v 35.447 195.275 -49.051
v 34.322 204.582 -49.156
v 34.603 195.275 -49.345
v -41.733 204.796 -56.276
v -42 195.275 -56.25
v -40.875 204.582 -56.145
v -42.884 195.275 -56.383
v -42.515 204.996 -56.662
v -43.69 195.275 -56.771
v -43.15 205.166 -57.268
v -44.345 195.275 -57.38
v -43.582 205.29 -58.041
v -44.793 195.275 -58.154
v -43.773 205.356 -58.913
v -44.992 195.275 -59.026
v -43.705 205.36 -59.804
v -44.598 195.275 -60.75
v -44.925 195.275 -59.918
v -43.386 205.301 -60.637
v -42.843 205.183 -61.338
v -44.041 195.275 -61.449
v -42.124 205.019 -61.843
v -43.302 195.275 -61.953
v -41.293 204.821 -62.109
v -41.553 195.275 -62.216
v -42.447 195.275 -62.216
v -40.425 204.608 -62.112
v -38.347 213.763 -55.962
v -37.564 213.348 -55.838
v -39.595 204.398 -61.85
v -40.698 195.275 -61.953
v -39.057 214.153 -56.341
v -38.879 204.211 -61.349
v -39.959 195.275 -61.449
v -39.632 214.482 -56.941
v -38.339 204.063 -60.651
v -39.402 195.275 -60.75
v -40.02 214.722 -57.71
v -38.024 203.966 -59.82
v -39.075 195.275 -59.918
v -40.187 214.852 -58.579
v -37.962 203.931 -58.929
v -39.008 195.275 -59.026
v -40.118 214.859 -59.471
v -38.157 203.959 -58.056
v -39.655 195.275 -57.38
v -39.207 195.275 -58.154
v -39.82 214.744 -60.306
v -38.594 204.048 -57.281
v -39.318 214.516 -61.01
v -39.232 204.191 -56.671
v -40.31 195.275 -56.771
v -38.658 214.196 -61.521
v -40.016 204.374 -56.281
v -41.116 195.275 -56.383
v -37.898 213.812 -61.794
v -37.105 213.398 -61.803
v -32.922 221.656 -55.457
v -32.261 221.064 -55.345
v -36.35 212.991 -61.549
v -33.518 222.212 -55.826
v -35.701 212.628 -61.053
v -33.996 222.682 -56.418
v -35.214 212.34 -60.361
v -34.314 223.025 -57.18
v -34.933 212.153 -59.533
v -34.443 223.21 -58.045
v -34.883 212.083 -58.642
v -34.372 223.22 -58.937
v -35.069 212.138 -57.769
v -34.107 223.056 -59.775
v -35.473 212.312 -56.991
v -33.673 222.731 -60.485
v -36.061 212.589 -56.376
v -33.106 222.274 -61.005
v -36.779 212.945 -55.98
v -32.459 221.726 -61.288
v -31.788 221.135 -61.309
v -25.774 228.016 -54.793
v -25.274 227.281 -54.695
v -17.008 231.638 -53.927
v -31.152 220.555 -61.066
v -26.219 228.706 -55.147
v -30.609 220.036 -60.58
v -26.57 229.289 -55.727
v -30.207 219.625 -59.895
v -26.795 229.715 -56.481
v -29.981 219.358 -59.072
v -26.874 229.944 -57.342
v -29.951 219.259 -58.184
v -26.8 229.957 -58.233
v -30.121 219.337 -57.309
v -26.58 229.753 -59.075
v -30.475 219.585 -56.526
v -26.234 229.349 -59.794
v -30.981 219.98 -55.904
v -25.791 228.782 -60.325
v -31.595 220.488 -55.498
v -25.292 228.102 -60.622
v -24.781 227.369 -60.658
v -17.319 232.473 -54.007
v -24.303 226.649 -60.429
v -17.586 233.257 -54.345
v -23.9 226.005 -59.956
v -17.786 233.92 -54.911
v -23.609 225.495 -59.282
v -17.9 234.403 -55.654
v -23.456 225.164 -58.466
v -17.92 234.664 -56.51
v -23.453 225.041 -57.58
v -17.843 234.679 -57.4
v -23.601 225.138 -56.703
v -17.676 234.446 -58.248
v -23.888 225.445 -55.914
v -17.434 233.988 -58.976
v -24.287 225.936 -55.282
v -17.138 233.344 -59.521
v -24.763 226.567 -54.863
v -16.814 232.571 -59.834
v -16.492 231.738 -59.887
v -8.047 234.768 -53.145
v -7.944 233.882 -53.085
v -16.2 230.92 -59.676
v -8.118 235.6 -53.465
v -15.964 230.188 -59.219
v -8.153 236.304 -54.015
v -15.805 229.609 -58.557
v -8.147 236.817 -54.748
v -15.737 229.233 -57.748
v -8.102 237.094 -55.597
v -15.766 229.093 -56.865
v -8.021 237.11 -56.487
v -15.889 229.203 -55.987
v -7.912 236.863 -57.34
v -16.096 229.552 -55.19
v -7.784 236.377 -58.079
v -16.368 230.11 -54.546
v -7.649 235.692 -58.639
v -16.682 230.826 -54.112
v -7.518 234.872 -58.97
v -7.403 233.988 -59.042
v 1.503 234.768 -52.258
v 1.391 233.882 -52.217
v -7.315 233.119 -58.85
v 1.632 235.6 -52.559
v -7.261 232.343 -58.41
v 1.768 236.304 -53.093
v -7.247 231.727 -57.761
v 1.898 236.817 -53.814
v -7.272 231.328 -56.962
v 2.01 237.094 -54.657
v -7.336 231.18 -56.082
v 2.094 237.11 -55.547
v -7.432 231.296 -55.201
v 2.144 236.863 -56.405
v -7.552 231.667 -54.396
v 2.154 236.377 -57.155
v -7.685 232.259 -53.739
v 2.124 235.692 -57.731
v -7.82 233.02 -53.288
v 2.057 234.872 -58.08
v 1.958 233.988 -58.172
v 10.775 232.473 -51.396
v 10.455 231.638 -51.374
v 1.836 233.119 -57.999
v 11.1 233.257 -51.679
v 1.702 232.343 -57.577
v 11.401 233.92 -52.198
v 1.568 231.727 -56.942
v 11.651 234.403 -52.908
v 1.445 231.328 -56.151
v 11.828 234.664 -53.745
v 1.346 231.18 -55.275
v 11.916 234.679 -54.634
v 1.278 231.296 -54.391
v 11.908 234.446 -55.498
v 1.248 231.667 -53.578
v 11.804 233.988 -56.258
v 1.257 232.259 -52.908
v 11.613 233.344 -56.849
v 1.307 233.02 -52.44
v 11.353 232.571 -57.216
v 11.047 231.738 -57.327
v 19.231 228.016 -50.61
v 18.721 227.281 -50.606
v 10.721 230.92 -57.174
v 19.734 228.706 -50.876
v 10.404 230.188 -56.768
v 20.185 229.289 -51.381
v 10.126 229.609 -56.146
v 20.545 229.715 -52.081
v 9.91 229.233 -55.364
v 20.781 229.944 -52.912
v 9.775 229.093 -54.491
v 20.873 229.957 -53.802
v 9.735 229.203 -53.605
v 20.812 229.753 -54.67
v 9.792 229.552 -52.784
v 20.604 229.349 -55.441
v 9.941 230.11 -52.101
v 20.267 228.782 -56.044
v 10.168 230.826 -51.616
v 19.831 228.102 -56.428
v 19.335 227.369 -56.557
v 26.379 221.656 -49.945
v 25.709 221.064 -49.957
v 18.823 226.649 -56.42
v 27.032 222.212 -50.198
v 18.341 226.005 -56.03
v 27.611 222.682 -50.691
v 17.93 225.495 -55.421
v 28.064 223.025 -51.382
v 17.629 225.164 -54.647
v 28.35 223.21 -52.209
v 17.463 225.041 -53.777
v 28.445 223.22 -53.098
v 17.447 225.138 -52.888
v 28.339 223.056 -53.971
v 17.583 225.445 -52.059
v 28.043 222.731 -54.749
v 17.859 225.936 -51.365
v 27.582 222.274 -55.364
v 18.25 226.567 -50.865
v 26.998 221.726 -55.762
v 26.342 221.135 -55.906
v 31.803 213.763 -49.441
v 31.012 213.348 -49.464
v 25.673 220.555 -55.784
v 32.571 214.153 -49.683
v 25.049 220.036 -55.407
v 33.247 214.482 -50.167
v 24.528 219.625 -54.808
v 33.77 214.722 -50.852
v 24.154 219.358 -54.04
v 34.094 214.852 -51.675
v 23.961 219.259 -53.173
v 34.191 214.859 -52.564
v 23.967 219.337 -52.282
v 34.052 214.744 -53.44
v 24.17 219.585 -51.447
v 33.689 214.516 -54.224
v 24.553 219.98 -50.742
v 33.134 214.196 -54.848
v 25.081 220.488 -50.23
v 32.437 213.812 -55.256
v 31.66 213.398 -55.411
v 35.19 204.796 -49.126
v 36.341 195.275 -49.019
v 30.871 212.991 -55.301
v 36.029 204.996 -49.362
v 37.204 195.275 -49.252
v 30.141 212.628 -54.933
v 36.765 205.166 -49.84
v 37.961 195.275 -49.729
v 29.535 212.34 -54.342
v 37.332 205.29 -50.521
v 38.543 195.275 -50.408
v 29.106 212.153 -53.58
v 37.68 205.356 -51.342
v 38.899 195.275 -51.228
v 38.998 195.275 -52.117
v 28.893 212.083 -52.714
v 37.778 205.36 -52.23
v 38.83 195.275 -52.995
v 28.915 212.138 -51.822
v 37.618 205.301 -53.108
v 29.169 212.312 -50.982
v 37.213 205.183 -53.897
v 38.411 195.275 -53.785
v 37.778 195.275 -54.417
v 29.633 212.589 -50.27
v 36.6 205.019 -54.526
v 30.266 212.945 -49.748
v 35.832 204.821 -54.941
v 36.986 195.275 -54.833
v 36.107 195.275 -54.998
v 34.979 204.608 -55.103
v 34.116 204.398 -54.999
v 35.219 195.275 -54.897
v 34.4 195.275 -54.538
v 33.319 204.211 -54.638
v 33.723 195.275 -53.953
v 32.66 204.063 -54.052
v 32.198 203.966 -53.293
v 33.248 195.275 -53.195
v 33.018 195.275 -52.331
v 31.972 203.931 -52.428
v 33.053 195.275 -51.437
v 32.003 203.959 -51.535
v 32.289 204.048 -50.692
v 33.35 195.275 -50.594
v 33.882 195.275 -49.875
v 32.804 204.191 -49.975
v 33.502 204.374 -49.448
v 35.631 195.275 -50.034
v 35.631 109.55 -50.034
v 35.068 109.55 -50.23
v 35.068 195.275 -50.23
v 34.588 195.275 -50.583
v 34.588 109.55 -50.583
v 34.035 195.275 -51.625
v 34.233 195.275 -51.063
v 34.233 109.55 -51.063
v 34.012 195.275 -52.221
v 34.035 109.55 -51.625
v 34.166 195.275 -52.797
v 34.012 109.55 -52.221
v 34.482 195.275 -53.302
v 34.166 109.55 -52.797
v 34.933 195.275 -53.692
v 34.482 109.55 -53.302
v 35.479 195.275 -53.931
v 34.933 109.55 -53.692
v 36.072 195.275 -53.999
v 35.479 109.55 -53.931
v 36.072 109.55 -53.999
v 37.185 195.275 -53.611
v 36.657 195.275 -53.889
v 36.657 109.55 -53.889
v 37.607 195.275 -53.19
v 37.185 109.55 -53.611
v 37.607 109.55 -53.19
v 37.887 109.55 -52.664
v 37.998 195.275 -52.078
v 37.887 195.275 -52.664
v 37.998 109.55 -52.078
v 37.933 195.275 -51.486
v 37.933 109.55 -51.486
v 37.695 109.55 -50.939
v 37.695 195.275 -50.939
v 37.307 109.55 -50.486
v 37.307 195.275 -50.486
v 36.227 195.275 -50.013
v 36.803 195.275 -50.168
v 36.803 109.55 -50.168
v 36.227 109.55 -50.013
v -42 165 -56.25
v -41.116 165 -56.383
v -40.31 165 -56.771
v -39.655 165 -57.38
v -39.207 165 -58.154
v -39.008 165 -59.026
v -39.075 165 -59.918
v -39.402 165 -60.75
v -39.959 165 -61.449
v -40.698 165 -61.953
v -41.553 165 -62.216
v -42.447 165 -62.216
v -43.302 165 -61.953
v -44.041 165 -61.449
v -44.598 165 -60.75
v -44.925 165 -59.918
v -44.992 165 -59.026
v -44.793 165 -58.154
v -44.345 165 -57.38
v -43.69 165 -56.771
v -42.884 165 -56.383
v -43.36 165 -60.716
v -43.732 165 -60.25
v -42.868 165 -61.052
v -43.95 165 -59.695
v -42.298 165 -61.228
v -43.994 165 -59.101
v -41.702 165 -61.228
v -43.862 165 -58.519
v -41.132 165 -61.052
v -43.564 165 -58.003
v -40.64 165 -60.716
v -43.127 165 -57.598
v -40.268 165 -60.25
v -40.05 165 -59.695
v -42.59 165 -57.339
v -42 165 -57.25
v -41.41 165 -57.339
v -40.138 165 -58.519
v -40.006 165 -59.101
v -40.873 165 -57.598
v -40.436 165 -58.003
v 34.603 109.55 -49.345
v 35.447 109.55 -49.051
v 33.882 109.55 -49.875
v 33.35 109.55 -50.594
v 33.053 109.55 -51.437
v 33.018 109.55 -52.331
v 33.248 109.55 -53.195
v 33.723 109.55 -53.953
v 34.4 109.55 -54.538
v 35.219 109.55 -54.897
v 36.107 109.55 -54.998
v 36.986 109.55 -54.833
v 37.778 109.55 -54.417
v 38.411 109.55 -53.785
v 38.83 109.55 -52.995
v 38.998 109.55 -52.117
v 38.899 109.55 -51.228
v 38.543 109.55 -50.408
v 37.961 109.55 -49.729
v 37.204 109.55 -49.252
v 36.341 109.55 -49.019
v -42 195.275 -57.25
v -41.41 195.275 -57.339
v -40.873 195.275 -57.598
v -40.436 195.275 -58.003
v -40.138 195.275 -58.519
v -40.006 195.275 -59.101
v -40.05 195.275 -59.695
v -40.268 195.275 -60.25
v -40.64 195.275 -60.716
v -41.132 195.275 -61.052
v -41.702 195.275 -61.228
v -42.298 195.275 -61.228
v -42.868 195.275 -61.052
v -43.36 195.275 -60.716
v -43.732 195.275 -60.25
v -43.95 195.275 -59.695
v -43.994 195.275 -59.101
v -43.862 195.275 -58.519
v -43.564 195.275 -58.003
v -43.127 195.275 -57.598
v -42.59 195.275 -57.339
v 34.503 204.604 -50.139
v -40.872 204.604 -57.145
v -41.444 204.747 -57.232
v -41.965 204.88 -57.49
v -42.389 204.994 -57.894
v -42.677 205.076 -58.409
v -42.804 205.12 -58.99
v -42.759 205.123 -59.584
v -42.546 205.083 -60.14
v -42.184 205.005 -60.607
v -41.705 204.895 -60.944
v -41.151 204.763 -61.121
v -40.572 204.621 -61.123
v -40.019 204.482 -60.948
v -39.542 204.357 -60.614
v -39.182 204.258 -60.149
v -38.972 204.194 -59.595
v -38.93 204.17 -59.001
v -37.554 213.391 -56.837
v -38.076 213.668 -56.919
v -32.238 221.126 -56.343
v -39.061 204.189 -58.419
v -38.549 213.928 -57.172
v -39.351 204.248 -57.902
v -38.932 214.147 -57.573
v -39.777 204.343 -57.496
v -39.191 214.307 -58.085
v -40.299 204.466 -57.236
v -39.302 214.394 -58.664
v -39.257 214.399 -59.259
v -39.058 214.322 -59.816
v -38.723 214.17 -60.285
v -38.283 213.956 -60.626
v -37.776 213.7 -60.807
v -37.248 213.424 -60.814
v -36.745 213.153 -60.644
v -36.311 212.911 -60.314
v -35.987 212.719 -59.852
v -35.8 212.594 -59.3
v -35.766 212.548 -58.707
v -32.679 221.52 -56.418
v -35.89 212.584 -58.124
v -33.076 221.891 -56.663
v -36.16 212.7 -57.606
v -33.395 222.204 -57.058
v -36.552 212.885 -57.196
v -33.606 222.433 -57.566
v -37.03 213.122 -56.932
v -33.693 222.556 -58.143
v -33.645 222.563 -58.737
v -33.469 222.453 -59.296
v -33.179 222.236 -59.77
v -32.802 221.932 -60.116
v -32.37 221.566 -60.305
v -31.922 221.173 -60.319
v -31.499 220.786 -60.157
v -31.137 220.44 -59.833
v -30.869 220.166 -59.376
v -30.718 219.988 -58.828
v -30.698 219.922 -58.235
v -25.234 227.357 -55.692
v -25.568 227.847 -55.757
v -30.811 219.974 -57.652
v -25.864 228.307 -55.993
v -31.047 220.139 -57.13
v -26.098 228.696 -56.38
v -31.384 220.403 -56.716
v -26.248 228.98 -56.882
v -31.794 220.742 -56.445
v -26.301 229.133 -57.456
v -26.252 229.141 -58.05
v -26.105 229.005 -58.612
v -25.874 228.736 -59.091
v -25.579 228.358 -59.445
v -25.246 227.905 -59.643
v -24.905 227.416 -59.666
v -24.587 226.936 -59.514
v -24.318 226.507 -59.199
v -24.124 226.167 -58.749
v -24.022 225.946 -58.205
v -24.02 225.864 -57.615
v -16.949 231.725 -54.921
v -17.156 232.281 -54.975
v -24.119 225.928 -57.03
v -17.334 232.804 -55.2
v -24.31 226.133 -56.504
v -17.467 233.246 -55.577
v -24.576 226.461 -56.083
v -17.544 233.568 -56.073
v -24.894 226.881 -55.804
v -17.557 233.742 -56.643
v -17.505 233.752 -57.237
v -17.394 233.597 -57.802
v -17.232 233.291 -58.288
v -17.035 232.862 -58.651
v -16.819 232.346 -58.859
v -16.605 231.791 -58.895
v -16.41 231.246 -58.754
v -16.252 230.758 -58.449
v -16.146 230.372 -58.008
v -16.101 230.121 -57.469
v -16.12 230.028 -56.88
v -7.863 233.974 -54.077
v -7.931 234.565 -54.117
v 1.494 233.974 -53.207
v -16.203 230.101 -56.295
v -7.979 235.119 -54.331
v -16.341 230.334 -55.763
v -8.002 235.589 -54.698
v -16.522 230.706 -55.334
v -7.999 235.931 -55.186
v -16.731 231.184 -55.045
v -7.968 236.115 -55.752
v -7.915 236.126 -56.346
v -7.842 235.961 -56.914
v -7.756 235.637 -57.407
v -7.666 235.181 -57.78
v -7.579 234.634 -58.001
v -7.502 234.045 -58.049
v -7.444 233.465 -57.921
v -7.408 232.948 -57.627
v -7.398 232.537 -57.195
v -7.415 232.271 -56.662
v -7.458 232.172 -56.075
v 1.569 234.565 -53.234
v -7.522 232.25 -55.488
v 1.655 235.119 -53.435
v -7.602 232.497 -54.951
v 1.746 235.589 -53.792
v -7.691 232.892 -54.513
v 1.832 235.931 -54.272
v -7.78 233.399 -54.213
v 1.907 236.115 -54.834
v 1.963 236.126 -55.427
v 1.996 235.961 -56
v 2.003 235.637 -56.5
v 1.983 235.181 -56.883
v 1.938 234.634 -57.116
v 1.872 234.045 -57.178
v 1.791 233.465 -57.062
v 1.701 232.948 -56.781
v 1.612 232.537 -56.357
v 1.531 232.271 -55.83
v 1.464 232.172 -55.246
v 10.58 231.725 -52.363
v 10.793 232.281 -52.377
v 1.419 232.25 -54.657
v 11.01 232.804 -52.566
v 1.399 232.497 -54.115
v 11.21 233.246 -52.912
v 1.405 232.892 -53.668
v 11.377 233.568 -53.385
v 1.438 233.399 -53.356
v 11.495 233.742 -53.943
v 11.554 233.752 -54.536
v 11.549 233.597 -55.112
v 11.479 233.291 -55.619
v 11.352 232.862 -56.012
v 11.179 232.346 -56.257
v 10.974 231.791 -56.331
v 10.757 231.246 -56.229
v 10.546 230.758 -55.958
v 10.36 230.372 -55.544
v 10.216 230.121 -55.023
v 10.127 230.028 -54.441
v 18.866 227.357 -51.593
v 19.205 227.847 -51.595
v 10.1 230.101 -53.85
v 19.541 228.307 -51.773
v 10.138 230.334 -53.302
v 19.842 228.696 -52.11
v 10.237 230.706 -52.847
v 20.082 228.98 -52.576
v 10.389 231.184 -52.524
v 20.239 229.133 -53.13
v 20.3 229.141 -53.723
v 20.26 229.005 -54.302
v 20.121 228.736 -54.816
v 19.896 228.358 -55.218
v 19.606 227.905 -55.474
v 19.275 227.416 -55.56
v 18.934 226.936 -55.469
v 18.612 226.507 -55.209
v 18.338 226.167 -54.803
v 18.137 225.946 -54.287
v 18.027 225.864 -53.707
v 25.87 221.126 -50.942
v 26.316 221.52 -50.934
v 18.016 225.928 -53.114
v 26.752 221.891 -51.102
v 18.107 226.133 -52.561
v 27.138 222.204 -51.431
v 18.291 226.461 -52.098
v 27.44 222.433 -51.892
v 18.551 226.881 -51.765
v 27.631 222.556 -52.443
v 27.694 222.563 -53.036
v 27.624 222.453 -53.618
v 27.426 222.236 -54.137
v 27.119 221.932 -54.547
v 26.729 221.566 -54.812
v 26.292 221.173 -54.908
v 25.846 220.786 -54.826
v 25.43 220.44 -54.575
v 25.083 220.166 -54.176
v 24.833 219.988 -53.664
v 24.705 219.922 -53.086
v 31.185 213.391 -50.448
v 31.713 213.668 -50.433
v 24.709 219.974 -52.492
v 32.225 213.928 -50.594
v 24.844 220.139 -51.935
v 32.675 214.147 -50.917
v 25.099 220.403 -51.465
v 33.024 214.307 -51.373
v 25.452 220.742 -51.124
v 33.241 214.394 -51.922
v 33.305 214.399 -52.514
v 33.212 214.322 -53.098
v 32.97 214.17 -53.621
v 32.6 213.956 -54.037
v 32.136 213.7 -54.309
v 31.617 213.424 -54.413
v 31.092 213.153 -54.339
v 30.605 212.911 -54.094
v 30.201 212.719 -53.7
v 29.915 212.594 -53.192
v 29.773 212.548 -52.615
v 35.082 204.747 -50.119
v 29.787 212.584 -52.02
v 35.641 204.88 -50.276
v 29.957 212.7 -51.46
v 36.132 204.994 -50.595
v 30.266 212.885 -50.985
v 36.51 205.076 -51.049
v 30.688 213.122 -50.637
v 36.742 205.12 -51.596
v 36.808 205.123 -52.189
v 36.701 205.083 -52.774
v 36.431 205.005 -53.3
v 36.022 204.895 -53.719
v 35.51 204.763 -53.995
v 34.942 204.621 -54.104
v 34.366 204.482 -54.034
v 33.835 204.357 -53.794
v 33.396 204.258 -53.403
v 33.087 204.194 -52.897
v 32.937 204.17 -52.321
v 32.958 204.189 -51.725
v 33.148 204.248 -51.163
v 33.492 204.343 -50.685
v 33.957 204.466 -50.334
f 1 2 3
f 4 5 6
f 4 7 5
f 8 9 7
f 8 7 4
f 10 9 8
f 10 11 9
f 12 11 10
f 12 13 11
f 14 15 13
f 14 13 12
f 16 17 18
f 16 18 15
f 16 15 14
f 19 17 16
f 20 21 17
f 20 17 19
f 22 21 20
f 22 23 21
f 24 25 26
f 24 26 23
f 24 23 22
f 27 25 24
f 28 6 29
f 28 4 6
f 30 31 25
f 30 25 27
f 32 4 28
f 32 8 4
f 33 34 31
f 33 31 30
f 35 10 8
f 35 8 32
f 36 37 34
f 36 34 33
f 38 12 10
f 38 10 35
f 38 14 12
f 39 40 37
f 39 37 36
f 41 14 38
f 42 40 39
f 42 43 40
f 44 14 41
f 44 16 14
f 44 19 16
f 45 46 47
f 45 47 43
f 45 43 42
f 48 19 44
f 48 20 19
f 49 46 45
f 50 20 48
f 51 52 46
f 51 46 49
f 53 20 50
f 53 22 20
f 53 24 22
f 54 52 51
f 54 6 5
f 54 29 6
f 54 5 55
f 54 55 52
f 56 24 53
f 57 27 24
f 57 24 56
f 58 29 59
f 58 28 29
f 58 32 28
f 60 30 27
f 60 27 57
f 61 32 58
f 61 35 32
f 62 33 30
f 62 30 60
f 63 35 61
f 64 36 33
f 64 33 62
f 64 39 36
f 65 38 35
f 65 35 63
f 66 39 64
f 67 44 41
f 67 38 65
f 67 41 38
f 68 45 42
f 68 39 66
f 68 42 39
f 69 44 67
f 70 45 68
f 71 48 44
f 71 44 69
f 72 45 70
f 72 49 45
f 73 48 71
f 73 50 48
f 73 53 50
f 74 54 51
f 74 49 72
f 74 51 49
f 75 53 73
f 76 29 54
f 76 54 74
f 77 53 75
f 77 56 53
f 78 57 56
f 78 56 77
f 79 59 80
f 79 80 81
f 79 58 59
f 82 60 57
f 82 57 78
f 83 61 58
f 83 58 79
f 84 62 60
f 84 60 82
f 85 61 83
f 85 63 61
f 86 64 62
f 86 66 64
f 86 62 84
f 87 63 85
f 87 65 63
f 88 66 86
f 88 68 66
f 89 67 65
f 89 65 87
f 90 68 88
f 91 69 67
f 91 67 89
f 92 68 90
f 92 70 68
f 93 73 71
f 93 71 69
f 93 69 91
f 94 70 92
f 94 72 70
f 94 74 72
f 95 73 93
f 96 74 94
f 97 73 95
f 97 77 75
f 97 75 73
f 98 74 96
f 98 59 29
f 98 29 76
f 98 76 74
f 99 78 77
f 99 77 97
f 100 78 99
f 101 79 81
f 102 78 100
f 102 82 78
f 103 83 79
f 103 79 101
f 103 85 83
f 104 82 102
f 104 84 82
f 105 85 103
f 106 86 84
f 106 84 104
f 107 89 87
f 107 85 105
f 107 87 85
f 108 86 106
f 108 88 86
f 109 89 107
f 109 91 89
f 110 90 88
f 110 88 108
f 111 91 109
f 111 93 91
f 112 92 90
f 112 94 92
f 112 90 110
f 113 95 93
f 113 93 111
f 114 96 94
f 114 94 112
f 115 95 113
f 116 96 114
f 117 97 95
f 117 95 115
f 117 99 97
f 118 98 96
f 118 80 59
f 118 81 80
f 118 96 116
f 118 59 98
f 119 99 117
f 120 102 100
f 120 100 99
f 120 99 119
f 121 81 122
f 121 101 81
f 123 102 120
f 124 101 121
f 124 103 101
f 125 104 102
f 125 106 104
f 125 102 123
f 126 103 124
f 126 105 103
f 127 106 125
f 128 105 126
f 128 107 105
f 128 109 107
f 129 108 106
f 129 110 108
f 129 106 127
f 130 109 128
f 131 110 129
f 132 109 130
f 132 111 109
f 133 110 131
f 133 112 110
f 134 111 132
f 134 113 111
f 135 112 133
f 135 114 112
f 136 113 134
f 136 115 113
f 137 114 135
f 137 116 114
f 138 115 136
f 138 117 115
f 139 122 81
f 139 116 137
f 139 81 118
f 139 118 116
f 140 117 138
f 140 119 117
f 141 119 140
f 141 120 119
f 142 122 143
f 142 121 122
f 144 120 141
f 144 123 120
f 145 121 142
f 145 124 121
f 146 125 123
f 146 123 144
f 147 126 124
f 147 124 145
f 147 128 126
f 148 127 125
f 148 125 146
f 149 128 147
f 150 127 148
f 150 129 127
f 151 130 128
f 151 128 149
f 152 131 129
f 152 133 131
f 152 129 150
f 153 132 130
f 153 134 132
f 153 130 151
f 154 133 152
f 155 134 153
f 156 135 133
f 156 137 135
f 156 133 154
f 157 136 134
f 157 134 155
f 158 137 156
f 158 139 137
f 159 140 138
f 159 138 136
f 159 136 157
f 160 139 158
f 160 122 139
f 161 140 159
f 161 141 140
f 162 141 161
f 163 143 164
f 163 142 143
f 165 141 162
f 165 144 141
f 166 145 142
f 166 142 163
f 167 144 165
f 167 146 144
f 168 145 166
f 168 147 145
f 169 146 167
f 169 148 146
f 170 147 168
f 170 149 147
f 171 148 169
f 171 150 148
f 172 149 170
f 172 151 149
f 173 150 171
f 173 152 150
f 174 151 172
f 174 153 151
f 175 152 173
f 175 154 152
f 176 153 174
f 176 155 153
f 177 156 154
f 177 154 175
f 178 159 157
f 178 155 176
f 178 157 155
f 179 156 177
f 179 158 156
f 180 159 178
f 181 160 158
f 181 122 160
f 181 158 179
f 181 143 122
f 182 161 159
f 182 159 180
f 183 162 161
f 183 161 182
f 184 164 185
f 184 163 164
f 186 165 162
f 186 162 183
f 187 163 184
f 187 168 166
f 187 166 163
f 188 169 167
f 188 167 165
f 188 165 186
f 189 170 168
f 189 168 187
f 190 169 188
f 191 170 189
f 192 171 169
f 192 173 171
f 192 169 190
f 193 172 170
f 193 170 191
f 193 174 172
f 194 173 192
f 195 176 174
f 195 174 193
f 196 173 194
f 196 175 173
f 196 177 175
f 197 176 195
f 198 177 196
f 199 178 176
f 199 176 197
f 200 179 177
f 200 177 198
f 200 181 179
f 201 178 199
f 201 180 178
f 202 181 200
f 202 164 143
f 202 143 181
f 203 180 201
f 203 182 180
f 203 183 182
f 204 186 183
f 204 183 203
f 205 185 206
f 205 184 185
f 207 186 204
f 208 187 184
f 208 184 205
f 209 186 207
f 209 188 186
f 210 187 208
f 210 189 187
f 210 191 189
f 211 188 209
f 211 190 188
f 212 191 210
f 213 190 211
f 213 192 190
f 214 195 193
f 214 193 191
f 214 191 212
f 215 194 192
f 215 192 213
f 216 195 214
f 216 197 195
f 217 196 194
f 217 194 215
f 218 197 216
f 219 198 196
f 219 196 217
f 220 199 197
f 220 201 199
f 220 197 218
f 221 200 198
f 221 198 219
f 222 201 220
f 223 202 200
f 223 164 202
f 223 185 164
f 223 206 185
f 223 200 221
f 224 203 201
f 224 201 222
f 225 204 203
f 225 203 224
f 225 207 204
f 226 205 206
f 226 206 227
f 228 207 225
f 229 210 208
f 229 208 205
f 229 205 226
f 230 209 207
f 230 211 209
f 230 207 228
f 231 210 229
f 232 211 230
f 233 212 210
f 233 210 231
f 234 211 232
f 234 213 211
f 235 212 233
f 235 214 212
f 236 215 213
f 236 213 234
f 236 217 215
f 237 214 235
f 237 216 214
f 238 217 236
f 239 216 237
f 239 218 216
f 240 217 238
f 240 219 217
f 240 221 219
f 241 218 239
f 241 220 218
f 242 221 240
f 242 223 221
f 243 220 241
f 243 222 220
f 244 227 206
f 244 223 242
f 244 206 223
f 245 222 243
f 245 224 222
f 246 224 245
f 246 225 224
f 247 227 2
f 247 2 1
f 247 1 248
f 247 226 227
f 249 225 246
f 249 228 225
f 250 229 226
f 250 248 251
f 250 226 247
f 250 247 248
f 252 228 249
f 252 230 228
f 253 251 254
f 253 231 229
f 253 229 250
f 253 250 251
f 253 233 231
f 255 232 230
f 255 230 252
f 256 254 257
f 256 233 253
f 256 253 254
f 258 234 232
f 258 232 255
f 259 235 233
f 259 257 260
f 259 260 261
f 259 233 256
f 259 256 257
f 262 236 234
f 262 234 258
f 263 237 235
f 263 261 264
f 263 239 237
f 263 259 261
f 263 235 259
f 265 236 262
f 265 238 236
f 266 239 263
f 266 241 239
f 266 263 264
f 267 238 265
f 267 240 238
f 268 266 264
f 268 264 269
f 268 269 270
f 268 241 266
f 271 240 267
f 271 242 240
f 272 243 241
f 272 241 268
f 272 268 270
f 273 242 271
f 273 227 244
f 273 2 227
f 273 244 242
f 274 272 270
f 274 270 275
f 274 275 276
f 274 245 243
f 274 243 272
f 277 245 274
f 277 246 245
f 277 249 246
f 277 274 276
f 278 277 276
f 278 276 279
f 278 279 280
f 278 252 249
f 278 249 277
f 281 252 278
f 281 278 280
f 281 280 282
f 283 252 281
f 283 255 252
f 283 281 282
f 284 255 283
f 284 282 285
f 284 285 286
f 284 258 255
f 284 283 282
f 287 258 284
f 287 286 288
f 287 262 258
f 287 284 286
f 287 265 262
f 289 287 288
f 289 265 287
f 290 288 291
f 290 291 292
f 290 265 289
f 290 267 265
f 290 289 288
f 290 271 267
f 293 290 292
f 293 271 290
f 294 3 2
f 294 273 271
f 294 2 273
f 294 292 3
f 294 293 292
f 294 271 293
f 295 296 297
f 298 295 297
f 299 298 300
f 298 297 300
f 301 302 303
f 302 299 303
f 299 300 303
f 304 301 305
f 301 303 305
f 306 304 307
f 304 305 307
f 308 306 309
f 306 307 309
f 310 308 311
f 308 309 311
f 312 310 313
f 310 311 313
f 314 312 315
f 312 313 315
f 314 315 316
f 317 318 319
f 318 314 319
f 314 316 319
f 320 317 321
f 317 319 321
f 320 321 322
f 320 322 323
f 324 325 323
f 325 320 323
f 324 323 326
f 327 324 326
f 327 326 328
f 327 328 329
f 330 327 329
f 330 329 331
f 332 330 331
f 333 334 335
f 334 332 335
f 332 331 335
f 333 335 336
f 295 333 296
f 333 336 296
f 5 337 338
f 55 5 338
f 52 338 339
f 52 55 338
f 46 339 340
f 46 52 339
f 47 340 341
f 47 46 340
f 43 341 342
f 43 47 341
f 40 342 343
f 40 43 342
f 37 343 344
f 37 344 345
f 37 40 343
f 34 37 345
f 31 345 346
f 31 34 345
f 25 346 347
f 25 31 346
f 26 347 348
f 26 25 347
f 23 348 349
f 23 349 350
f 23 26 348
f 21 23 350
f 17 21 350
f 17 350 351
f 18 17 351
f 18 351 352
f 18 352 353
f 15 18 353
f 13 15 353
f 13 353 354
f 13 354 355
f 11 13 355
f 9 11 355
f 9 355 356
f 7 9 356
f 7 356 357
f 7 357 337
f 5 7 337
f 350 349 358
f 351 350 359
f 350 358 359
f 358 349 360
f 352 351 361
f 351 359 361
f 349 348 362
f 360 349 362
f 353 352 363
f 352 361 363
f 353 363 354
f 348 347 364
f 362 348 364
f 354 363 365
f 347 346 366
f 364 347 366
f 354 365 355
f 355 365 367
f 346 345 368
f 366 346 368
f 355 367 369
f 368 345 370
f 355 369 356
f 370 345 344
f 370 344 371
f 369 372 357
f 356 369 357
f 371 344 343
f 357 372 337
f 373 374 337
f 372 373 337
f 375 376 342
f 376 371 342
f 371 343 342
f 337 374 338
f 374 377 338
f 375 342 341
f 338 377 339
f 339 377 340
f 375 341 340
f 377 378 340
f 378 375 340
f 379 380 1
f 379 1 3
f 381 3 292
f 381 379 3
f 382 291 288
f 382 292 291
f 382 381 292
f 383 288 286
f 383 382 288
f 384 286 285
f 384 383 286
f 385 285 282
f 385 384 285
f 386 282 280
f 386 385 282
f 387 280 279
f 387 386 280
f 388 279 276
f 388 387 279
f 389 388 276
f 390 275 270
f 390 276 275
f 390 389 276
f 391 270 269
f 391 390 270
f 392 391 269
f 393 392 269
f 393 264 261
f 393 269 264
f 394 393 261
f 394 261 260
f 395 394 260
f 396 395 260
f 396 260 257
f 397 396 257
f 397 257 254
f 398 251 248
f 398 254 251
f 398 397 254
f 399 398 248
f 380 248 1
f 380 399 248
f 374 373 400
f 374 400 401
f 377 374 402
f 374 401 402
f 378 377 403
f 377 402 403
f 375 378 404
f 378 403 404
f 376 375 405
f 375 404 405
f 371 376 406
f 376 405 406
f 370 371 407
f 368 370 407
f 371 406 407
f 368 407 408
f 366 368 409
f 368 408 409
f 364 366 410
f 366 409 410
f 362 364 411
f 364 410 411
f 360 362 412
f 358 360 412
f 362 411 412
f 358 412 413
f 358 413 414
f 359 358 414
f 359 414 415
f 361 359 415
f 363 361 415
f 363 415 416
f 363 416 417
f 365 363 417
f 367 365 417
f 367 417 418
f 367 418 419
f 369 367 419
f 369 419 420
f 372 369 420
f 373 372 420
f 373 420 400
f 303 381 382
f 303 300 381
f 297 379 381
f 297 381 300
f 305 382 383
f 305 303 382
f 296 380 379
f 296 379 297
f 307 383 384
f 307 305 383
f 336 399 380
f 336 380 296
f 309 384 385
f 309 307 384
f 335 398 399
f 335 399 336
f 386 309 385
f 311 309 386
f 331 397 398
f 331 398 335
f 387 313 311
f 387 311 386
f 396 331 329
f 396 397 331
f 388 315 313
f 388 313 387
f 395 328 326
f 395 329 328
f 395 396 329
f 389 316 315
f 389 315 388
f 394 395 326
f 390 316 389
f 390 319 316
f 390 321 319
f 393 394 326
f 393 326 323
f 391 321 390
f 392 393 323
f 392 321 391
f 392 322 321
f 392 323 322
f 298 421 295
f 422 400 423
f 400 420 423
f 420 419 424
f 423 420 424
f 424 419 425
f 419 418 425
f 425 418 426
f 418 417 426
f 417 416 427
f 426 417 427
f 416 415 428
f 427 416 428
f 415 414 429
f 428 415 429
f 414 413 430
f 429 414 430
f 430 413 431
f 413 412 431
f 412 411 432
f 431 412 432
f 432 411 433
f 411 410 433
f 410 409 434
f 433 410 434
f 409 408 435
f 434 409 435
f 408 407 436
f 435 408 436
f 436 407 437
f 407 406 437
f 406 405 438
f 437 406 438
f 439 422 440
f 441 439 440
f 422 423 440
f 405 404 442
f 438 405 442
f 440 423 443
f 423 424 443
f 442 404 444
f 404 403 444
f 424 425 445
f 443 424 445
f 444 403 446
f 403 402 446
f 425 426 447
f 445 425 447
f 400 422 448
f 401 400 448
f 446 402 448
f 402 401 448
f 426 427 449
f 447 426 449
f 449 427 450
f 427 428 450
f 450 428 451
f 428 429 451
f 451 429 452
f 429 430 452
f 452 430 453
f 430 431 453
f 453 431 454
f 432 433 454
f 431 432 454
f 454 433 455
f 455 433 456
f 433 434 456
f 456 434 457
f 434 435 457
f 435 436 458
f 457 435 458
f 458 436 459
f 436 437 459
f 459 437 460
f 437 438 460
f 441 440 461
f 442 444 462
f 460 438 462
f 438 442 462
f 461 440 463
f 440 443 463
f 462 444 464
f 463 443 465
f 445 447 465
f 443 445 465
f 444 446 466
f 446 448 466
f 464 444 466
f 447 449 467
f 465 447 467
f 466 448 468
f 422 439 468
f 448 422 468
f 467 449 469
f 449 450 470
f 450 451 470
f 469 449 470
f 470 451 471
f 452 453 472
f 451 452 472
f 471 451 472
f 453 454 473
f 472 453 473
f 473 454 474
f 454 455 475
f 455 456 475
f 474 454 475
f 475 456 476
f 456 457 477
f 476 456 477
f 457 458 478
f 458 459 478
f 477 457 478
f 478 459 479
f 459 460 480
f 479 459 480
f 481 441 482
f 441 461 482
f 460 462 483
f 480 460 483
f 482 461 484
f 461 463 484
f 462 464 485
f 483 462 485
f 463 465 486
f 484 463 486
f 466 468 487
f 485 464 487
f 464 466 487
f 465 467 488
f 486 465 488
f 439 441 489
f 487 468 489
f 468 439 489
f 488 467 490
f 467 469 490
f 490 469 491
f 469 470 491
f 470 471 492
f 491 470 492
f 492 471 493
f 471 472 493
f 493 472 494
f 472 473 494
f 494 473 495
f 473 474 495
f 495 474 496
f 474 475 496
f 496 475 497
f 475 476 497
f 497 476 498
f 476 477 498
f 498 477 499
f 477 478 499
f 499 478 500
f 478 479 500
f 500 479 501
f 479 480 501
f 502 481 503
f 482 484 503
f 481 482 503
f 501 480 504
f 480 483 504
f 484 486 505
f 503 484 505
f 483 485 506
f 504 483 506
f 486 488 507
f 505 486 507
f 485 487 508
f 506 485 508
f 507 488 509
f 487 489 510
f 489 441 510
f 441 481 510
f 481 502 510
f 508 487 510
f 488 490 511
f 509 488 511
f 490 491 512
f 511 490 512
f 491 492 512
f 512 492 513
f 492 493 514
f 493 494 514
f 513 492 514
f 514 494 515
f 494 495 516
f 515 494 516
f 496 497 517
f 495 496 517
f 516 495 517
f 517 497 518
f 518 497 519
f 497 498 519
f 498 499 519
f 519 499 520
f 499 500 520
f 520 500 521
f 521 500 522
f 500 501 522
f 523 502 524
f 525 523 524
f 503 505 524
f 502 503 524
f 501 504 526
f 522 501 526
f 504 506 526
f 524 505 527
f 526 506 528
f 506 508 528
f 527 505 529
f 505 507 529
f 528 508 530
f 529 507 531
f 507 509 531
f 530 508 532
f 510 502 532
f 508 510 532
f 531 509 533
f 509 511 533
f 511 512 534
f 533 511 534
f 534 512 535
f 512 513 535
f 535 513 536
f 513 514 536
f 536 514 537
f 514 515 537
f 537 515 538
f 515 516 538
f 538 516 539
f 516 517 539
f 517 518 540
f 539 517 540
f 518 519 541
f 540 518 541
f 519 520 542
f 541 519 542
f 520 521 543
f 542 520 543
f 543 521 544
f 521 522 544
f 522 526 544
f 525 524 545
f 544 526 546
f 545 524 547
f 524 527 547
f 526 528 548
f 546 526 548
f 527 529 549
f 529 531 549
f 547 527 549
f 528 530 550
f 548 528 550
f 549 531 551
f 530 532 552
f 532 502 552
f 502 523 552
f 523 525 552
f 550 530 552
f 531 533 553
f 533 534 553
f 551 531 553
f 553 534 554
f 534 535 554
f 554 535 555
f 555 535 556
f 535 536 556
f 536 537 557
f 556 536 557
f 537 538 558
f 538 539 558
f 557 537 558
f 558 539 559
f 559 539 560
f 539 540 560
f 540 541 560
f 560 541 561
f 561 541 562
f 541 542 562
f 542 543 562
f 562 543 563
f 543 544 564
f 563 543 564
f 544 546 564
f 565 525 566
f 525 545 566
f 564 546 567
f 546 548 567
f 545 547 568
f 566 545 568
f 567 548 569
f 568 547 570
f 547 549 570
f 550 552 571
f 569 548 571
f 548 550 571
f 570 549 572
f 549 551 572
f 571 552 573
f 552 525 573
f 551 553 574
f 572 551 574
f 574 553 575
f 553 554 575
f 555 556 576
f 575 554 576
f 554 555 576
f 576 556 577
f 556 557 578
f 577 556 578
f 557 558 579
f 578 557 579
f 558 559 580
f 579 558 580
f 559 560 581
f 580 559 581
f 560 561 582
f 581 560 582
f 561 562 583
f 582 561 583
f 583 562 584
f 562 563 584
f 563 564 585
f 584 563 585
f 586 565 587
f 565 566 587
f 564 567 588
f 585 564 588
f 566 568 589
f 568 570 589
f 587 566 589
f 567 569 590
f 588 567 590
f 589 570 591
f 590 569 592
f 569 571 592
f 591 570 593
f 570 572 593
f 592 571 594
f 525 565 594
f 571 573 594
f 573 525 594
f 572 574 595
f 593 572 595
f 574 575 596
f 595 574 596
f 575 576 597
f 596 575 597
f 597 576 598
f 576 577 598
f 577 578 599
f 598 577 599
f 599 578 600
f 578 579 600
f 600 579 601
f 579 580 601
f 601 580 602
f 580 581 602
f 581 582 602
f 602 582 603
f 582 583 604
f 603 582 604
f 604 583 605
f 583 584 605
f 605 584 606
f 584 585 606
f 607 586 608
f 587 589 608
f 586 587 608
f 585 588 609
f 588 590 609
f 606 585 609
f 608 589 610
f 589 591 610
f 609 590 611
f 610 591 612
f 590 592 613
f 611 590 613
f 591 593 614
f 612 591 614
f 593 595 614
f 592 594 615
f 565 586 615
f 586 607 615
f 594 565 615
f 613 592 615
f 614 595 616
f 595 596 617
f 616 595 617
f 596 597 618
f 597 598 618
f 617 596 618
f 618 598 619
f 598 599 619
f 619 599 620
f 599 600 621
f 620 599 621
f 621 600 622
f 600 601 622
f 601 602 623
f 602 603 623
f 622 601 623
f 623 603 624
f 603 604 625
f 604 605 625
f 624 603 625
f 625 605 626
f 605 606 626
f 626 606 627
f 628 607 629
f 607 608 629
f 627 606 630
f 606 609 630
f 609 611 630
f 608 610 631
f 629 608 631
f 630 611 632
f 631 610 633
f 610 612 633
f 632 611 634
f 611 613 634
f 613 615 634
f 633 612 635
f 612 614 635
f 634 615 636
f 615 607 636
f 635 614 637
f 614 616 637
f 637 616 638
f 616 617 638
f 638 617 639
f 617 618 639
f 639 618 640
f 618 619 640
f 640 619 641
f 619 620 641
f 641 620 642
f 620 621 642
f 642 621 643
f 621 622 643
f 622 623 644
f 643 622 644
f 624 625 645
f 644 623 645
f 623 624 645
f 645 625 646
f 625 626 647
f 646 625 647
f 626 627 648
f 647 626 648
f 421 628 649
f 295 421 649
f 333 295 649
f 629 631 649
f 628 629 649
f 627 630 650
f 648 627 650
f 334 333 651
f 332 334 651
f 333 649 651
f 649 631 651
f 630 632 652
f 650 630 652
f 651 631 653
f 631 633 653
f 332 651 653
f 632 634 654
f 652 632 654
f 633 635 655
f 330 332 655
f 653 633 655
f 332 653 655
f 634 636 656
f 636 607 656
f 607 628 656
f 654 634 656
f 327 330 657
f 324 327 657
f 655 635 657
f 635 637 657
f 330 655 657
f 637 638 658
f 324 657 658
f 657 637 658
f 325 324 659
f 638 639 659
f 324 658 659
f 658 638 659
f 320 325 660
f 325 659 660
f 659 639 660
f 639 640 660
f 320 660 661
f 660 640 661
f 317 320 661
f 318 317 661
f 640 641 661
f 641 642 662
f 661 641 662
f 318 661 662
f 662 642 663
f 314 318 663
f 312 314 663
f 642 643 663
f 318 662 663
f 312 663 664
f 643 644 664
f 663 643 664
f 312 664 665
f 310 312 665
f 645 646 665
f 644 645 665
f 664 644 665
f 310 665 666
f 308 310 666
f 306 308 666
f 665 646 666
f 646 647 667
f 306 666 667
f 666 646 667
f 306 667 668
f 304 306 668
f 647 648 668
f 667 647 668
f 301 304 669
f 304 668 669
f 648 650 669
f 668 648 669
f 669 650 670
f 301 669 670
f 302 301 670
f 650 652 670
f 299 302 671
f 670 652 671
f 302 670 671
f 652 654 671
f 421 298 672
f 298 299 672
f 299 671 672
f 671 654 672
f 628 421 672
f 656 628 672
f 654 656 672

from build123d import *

# Parameters (mm, degrees)
BALAYAGE_MINCE1_PROFILE_R   = 3
BALAYAGE_MINCE1_PROFILE_R_2 = 2


with BuildPart() as part:
    # Balayage-Mince1: sweep along a curve in space
    with BuildLine() as balayage_mince1_path:
        Line((-42, 165, -59.25), (-42, 195.275, -59.25))
        ThreePointArc((-42, 195.275, -59.25), (-3, 234.443107243, -55.625), (36, 195.275, -52))
        Line((36, 195.275, -52), (36, 109.55, -52))
    # Balayage-Mince1 profile (on start of the path) → Balayage-Mince1 (sweep)
    with BuildSketch(Plane(origin=(-42, 165, -59.25), x_dir=(0, 0, 1), z_dir=(0, 1, 0))):
        Circle(BALAYAGE_MINCE1_PROFILE_R)
        Circle(BALAYAGE_MINCE1_PROFILE_R_2, mode=Mode.SUBTRACT)
    sweep(path=balayage_mince1_path.line)


solid = part.part
